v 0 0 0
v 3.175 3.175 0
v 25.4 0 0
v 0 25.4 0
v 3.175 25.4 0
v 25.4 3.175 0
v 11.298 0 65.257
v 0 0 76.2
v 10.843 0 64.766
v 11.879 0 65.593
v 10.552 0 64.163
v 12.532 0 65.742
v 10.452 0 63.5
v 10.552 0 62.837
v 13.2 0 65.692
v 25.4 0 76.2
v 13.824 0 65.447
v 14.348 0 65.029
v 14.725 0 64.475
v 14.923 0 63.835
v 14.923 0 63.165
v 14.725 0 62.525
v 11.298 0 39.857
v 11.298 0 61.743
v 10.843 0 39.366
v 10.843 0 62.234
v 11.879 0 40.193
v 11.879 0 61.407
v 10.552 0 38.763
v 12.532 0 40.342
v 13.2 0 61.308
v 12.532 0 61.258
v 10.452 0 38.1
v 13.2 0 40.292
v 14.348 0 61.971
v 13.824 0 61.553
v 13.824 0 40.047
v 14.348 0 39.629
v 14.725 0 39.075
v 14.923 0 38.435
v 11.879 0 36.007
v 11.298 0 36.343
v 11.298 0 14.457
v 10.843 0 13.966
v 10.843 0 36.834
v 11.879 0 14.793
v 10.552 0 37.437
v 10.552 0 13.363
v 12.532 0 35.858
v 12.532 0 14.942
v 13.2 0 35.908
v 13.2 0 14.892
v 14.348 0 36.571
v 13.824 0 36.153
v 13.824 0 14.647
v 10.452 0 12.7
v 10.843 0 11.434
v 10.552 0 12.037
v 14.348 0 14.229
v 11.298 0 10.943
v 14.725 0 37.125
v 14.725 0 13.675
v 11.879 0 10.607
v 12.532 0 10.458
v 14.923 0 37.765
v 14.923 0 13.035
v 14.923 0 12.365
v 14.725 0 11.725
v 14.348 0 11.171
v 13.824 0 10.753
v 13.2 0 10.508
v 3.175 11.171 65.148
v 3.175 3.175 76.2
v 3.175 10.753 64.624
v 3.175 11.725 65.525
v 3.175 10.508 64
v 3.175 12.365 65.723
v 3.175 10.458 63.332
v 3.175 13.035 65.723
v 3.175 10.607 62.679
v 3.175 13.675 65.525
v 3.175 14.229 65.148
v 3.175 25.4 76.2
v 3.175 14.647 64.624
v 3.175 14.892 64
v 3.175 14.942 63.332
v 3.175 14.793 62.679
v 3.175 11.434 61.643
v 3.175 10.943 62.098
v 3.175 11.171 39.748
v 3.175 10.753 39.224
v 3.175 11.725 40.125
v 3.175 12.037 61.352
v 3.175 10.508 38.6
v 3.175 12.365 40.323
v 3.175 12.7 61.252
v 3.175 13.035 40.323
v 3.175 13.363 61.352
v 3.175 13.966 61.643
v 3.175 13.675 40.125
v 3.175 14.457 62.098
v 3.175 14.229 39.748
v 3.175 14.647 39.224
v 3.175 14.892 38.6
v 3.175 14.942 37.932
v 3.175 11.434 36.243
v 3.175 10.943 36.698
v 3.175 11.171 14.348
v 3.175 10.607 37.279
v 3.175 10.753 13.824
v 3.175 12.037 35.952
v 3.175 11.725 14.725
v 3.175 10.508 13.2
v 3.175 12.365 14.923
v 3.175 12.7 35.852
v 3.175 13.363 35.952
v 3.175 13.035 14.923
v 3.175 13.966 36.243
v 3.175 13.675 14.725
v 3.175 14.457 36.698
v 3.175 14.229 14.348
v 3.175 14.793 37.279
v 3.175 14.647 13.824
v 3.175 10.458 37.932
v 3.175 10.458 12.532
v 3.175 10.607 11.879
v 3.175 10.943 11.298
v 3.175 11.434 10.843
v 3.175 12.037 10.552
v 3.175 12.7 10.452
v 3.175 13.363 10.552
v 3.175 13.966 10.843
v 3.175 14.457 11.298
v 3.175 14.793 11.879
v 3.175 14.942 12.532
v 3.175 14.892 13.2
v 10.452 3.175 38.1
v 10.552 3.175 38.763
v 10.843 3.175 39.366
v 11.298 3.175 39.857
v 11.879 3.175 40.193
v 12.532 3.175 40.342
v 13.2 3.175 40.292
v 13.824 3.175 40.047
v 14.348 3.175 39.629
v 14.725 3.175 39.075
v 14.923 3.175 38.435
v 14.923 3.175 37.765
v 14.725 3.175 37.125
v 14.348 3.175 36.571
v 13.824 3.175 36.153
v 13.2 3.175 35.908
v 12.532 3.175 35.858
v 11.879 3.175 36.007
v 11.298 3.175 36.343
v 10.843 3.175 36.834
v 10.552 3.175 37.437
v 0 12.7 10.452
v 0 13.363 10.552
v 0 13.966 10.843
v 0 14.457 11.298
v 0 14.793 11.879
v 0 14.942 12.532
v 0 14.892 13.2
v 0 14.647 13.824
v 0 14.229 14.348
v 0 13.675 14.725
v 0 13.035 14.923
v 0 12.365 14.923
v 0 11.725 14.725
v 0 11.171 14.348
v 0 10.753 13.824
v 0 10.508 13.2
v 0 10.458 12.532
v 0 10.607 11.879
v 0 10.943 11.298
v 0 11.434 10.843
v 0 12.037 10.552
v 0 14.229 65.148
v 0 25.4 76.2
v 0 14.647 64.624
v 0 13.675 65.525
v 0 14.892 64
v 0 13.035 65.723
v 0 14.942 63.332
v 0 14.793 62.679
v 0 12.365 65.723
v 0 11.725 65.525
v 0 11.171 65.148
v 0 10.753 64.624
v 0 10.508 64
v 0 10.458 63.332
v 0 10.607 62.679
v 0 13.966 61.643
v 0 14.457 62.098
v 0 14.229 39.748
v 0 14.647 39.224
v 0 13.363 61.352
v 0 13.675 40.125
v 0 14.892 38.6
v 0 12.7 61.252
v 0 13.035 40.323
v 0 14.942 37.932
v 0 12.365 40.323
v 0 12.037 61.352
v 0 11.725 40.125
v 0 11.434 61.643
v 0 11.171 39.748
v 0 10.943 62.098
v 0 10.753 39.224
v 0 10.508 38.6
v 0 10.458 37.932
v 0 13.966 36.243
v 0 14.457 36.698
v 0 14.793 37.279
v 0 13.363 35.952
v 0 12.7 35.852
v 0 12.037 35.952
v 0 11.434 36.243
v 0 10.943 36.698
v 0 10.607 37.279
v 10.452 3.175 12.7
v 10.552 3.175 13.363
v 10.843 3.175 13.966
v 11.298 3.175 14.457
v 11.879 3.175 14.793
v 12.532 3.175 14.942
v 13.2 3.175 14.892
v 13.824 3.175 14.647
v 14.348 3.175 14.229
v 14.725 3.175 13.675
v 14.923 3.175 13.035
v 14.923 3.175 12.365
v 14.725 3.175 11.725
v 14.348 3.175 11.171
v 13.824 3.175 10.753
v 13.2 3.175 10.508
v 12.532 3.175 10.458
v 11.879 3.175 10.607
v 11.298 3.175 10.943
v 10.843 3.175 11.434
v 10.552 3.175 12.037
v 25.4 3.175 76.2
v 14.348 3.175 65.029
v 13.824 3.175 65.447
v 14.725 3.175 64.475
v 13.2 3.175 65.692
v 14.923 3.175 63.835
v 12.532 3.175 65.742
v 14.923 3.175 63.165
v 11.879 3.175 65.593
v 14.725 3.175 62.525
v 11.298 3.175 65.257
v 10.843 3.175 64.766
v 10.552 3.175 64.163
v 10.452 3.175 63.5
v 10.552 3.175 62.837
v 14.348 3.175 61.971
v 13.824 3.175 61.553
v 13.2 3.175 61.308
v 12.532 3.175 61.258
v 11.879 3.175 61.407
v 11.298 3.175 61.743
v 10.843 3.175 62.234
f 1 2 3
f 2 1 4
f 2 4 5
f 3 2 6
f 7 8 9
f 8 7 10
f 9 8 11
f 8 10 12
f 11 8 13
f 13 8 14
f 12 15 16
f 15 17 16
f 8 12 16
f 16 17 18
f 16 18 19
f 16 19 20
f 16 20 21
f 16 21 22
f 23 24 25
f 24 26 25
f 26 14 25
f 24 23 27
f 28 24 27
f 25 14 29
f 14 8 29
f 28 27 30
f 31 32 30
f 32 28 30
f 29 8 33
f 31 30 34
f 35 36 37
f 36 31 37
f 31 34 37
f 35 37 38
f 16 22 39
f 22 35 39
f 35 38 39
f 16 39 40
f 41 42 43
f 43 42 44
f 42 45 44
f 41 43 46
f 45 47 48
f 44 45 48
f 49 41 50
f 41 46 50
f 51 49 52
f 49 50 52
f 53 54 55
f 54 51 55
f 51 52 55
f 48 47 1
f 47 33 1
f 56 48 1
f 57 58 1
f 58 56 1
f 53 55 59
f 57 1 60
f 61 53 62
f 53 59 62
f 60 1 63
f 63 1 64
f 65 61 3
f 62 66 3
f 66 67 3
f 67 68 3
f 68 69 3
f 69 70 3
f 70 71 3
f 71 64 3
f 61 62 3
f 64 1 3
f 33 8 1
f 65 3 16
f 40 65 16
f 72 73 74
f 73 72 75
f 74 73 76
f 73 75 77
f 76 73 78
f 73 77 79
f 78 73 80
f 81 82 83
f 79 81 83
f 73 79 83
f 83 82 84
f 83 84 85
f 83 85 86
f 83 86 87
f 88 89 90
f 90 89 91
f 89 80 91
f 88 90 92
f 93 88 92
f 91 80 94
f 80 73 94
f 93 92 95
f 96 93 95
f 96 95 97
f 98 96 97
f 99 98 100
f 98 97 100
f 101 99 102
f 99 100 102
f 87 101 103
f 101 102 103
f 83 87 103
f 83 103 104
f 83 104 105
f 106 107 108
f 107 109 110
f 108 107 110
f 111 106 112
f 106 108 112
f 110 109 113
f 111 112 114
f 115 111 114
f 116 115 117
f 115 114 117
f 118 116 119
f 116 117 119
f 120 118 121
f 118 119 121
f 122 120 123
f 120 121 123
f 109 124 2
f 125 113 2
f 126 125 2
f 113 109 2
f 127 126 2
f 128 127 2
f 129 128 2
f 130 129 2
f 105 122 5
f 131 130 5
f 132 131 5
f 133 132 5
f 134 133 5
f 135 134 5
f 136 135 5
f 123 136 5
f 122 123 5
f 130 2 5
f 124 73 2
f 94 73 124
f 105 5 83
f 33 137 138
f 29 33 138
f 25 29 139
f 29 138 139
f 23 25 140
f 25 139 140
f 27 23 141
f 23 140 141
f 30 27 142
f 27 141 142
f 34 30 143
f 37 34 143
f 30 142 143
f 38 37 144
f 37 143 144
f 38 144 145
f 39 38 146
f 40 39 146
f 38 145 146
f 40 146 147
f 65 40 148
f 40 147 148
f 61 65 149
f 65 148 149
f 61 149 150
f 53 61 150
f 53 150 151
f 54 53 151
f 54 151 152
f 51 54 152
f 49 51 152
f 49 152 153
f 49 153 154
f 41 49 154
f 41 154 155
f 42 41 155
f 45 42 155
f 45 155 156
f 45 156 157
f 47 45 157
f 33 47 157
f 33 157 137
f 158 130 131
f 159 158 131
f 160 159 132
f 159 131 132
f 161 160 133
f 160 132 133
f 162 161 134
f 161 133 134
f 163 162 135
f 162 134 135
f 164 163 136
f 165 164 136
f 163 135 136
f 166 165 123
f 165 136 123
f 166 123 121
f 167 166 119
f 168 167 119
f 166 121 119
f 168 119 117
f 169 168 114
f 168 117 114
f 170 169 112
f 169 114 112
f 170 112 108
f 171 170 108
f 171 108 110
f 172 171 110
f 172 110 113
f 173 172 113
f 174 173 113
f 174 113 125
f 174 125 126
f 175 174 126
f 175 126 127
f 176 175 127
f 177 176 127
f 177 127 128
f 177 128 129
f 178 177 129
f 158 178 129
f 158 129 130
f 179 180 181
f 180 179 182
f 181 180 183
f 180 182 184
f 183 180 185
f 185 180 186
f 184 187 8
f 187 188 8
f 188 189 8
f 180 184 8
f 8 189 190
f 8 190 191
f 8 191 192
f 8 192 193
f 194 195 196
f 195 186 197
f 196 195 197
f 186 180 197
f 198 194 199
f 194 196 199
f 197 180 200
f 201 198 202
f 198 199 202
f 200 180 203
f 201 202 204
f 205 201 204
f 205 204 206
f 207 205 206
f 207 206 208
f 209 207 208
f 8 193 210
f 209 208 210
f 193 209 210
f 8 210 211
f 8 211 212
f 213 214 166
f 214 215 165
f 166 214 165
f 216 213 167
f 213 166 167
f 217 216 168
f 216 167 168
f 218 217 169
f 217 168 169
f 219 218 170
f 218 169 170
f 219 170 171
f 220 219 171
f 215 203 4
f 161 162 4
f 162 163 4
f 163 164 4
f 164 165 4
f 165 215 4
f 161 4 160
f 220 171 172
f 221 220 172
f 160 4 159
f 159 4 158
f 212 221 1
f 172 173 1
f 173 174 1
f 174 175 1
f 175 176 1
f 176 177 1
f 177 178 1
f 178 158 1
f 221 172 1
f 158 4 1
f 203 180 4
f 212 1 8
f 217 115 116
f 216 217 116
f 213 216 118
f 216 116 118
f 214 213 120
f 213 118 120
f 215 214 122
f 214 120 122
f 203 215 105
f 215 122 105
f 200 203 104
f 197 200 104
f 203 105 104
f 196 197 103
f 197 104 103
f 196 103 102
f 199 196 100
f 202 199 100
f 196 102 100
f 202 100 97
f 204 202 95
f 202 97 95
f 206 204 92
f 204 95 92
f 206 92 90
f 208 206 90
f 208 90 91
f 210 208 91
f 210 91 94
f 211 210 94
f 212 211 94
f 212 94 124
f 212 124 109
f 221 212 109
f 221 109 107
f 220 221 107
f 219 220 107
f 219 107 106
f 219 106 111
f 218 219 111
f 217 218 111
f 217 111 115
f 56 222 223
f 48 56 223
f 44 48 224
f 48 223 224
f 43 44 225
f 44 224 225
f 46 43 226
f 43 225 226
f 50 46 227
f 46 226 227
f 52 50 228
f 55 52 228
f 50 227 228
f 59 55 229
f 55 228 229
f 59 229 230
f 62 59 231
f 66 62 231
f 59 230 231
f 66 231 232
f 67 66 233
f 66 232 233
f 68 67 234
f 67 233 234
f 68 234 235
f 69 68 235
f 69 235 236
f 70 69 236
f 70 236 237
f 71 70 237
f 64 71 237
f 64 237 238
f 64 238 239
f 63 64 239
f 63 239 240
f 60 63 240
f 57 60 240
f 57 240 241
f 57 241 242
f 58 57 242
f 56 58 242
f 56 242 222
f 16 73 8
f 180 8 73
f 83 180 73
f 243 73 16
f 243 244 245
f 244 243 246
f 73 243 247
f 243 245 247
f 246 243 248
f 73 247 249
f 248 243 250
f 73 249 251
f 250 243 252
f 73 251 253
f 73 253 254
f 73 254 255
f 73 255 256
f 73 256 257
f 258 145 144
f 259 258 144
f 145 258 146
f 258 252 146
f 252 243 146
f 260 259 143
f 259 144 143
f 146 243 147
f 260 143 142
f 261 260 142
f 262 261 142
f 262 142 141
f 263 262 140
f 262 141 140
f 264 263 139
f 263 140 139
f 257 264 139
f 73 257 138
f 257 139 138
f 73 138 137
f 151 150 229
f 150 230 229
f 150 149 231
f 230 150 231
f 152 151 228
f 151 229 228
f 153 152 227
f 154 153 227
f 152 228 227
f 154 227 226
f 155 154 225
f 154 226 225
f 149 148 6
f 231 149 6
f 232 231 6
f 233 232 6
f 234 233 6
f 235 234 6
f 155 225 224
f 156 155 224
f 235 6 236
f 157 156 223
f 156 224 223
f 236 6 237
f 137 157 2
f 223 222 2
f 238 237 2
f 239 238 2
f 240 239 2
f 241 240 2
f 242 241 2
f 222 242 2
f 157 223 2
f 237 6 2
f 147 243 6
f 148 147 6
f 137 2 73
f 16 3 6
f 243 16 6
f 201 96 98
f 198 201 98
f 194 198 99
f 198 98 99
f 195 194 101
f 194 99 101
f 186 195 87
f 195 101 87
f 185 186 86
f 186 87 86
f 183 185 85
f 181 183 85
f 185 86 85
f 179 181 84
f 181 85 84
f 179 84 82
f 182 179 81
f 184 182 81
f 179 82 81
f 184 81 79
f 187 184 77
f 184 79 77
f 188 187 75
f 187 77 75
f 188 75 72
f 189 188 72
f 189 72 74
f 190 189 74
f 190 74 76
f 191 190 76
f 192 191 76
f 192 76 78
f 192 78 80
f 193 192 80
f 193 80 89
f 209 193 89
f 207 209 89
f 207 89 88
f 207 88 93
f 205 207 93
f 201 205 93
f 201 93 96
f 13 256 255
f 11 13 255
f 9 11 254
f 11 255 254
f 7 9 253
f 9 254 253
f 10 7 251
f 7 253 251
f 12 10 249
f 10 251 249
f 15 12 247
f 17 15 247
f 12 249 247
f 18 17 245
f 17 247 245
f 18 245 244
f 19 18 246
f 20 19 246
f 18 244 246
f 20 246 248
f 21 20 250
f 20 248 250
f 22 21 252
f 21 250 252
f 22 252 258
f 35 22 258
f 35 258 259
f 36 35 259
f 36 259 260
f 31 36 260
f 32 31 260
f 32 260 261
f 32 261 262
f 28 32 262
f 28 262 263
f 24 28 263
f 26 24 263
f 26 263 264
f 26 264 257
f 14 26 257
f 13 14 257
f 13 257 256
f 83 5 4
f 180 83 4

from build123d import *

# Parameters (mm, degrees)
BOSS_EXTRUDE1_DEPTH   = 76.2
F_8_CLEARANCE_HOLE1_D = 4.4958
F_8_CLEARANCE_HOLE2_D = 4.4958


with BuildPart() as part:
    # Sketch1 → Boss-Extrude1 (new body)
    with BuildSketch(Plane.XY):
        Polygon((0, 0), (25.4, 0), (25.4, 3.175), (3.175, 3.175), (3.175, 25.4), (0, 25.4), align=None)
    extrude(amount=BOSS_EXTRUDE1_DEPTH)

    # #8 Clearance Hole1 (through all)
    with Locations(Plane.XZ):
        with Locations((12.7, 63.5), (12.7, 38.1), (12.7, 12.7)):
            Hole(F_8_CLEARANCE_HOLE1_D / 2)

    # #8 Clearance Hole2 (through all)
    with Locations(Plane.ZY):
        with Locations((63.5, 12.7), (38.1, 12.7), (12.7, 12.7)):
            Hole(F_8_CLEARANCE_HOLE2_D / 2)


solid = part.part
